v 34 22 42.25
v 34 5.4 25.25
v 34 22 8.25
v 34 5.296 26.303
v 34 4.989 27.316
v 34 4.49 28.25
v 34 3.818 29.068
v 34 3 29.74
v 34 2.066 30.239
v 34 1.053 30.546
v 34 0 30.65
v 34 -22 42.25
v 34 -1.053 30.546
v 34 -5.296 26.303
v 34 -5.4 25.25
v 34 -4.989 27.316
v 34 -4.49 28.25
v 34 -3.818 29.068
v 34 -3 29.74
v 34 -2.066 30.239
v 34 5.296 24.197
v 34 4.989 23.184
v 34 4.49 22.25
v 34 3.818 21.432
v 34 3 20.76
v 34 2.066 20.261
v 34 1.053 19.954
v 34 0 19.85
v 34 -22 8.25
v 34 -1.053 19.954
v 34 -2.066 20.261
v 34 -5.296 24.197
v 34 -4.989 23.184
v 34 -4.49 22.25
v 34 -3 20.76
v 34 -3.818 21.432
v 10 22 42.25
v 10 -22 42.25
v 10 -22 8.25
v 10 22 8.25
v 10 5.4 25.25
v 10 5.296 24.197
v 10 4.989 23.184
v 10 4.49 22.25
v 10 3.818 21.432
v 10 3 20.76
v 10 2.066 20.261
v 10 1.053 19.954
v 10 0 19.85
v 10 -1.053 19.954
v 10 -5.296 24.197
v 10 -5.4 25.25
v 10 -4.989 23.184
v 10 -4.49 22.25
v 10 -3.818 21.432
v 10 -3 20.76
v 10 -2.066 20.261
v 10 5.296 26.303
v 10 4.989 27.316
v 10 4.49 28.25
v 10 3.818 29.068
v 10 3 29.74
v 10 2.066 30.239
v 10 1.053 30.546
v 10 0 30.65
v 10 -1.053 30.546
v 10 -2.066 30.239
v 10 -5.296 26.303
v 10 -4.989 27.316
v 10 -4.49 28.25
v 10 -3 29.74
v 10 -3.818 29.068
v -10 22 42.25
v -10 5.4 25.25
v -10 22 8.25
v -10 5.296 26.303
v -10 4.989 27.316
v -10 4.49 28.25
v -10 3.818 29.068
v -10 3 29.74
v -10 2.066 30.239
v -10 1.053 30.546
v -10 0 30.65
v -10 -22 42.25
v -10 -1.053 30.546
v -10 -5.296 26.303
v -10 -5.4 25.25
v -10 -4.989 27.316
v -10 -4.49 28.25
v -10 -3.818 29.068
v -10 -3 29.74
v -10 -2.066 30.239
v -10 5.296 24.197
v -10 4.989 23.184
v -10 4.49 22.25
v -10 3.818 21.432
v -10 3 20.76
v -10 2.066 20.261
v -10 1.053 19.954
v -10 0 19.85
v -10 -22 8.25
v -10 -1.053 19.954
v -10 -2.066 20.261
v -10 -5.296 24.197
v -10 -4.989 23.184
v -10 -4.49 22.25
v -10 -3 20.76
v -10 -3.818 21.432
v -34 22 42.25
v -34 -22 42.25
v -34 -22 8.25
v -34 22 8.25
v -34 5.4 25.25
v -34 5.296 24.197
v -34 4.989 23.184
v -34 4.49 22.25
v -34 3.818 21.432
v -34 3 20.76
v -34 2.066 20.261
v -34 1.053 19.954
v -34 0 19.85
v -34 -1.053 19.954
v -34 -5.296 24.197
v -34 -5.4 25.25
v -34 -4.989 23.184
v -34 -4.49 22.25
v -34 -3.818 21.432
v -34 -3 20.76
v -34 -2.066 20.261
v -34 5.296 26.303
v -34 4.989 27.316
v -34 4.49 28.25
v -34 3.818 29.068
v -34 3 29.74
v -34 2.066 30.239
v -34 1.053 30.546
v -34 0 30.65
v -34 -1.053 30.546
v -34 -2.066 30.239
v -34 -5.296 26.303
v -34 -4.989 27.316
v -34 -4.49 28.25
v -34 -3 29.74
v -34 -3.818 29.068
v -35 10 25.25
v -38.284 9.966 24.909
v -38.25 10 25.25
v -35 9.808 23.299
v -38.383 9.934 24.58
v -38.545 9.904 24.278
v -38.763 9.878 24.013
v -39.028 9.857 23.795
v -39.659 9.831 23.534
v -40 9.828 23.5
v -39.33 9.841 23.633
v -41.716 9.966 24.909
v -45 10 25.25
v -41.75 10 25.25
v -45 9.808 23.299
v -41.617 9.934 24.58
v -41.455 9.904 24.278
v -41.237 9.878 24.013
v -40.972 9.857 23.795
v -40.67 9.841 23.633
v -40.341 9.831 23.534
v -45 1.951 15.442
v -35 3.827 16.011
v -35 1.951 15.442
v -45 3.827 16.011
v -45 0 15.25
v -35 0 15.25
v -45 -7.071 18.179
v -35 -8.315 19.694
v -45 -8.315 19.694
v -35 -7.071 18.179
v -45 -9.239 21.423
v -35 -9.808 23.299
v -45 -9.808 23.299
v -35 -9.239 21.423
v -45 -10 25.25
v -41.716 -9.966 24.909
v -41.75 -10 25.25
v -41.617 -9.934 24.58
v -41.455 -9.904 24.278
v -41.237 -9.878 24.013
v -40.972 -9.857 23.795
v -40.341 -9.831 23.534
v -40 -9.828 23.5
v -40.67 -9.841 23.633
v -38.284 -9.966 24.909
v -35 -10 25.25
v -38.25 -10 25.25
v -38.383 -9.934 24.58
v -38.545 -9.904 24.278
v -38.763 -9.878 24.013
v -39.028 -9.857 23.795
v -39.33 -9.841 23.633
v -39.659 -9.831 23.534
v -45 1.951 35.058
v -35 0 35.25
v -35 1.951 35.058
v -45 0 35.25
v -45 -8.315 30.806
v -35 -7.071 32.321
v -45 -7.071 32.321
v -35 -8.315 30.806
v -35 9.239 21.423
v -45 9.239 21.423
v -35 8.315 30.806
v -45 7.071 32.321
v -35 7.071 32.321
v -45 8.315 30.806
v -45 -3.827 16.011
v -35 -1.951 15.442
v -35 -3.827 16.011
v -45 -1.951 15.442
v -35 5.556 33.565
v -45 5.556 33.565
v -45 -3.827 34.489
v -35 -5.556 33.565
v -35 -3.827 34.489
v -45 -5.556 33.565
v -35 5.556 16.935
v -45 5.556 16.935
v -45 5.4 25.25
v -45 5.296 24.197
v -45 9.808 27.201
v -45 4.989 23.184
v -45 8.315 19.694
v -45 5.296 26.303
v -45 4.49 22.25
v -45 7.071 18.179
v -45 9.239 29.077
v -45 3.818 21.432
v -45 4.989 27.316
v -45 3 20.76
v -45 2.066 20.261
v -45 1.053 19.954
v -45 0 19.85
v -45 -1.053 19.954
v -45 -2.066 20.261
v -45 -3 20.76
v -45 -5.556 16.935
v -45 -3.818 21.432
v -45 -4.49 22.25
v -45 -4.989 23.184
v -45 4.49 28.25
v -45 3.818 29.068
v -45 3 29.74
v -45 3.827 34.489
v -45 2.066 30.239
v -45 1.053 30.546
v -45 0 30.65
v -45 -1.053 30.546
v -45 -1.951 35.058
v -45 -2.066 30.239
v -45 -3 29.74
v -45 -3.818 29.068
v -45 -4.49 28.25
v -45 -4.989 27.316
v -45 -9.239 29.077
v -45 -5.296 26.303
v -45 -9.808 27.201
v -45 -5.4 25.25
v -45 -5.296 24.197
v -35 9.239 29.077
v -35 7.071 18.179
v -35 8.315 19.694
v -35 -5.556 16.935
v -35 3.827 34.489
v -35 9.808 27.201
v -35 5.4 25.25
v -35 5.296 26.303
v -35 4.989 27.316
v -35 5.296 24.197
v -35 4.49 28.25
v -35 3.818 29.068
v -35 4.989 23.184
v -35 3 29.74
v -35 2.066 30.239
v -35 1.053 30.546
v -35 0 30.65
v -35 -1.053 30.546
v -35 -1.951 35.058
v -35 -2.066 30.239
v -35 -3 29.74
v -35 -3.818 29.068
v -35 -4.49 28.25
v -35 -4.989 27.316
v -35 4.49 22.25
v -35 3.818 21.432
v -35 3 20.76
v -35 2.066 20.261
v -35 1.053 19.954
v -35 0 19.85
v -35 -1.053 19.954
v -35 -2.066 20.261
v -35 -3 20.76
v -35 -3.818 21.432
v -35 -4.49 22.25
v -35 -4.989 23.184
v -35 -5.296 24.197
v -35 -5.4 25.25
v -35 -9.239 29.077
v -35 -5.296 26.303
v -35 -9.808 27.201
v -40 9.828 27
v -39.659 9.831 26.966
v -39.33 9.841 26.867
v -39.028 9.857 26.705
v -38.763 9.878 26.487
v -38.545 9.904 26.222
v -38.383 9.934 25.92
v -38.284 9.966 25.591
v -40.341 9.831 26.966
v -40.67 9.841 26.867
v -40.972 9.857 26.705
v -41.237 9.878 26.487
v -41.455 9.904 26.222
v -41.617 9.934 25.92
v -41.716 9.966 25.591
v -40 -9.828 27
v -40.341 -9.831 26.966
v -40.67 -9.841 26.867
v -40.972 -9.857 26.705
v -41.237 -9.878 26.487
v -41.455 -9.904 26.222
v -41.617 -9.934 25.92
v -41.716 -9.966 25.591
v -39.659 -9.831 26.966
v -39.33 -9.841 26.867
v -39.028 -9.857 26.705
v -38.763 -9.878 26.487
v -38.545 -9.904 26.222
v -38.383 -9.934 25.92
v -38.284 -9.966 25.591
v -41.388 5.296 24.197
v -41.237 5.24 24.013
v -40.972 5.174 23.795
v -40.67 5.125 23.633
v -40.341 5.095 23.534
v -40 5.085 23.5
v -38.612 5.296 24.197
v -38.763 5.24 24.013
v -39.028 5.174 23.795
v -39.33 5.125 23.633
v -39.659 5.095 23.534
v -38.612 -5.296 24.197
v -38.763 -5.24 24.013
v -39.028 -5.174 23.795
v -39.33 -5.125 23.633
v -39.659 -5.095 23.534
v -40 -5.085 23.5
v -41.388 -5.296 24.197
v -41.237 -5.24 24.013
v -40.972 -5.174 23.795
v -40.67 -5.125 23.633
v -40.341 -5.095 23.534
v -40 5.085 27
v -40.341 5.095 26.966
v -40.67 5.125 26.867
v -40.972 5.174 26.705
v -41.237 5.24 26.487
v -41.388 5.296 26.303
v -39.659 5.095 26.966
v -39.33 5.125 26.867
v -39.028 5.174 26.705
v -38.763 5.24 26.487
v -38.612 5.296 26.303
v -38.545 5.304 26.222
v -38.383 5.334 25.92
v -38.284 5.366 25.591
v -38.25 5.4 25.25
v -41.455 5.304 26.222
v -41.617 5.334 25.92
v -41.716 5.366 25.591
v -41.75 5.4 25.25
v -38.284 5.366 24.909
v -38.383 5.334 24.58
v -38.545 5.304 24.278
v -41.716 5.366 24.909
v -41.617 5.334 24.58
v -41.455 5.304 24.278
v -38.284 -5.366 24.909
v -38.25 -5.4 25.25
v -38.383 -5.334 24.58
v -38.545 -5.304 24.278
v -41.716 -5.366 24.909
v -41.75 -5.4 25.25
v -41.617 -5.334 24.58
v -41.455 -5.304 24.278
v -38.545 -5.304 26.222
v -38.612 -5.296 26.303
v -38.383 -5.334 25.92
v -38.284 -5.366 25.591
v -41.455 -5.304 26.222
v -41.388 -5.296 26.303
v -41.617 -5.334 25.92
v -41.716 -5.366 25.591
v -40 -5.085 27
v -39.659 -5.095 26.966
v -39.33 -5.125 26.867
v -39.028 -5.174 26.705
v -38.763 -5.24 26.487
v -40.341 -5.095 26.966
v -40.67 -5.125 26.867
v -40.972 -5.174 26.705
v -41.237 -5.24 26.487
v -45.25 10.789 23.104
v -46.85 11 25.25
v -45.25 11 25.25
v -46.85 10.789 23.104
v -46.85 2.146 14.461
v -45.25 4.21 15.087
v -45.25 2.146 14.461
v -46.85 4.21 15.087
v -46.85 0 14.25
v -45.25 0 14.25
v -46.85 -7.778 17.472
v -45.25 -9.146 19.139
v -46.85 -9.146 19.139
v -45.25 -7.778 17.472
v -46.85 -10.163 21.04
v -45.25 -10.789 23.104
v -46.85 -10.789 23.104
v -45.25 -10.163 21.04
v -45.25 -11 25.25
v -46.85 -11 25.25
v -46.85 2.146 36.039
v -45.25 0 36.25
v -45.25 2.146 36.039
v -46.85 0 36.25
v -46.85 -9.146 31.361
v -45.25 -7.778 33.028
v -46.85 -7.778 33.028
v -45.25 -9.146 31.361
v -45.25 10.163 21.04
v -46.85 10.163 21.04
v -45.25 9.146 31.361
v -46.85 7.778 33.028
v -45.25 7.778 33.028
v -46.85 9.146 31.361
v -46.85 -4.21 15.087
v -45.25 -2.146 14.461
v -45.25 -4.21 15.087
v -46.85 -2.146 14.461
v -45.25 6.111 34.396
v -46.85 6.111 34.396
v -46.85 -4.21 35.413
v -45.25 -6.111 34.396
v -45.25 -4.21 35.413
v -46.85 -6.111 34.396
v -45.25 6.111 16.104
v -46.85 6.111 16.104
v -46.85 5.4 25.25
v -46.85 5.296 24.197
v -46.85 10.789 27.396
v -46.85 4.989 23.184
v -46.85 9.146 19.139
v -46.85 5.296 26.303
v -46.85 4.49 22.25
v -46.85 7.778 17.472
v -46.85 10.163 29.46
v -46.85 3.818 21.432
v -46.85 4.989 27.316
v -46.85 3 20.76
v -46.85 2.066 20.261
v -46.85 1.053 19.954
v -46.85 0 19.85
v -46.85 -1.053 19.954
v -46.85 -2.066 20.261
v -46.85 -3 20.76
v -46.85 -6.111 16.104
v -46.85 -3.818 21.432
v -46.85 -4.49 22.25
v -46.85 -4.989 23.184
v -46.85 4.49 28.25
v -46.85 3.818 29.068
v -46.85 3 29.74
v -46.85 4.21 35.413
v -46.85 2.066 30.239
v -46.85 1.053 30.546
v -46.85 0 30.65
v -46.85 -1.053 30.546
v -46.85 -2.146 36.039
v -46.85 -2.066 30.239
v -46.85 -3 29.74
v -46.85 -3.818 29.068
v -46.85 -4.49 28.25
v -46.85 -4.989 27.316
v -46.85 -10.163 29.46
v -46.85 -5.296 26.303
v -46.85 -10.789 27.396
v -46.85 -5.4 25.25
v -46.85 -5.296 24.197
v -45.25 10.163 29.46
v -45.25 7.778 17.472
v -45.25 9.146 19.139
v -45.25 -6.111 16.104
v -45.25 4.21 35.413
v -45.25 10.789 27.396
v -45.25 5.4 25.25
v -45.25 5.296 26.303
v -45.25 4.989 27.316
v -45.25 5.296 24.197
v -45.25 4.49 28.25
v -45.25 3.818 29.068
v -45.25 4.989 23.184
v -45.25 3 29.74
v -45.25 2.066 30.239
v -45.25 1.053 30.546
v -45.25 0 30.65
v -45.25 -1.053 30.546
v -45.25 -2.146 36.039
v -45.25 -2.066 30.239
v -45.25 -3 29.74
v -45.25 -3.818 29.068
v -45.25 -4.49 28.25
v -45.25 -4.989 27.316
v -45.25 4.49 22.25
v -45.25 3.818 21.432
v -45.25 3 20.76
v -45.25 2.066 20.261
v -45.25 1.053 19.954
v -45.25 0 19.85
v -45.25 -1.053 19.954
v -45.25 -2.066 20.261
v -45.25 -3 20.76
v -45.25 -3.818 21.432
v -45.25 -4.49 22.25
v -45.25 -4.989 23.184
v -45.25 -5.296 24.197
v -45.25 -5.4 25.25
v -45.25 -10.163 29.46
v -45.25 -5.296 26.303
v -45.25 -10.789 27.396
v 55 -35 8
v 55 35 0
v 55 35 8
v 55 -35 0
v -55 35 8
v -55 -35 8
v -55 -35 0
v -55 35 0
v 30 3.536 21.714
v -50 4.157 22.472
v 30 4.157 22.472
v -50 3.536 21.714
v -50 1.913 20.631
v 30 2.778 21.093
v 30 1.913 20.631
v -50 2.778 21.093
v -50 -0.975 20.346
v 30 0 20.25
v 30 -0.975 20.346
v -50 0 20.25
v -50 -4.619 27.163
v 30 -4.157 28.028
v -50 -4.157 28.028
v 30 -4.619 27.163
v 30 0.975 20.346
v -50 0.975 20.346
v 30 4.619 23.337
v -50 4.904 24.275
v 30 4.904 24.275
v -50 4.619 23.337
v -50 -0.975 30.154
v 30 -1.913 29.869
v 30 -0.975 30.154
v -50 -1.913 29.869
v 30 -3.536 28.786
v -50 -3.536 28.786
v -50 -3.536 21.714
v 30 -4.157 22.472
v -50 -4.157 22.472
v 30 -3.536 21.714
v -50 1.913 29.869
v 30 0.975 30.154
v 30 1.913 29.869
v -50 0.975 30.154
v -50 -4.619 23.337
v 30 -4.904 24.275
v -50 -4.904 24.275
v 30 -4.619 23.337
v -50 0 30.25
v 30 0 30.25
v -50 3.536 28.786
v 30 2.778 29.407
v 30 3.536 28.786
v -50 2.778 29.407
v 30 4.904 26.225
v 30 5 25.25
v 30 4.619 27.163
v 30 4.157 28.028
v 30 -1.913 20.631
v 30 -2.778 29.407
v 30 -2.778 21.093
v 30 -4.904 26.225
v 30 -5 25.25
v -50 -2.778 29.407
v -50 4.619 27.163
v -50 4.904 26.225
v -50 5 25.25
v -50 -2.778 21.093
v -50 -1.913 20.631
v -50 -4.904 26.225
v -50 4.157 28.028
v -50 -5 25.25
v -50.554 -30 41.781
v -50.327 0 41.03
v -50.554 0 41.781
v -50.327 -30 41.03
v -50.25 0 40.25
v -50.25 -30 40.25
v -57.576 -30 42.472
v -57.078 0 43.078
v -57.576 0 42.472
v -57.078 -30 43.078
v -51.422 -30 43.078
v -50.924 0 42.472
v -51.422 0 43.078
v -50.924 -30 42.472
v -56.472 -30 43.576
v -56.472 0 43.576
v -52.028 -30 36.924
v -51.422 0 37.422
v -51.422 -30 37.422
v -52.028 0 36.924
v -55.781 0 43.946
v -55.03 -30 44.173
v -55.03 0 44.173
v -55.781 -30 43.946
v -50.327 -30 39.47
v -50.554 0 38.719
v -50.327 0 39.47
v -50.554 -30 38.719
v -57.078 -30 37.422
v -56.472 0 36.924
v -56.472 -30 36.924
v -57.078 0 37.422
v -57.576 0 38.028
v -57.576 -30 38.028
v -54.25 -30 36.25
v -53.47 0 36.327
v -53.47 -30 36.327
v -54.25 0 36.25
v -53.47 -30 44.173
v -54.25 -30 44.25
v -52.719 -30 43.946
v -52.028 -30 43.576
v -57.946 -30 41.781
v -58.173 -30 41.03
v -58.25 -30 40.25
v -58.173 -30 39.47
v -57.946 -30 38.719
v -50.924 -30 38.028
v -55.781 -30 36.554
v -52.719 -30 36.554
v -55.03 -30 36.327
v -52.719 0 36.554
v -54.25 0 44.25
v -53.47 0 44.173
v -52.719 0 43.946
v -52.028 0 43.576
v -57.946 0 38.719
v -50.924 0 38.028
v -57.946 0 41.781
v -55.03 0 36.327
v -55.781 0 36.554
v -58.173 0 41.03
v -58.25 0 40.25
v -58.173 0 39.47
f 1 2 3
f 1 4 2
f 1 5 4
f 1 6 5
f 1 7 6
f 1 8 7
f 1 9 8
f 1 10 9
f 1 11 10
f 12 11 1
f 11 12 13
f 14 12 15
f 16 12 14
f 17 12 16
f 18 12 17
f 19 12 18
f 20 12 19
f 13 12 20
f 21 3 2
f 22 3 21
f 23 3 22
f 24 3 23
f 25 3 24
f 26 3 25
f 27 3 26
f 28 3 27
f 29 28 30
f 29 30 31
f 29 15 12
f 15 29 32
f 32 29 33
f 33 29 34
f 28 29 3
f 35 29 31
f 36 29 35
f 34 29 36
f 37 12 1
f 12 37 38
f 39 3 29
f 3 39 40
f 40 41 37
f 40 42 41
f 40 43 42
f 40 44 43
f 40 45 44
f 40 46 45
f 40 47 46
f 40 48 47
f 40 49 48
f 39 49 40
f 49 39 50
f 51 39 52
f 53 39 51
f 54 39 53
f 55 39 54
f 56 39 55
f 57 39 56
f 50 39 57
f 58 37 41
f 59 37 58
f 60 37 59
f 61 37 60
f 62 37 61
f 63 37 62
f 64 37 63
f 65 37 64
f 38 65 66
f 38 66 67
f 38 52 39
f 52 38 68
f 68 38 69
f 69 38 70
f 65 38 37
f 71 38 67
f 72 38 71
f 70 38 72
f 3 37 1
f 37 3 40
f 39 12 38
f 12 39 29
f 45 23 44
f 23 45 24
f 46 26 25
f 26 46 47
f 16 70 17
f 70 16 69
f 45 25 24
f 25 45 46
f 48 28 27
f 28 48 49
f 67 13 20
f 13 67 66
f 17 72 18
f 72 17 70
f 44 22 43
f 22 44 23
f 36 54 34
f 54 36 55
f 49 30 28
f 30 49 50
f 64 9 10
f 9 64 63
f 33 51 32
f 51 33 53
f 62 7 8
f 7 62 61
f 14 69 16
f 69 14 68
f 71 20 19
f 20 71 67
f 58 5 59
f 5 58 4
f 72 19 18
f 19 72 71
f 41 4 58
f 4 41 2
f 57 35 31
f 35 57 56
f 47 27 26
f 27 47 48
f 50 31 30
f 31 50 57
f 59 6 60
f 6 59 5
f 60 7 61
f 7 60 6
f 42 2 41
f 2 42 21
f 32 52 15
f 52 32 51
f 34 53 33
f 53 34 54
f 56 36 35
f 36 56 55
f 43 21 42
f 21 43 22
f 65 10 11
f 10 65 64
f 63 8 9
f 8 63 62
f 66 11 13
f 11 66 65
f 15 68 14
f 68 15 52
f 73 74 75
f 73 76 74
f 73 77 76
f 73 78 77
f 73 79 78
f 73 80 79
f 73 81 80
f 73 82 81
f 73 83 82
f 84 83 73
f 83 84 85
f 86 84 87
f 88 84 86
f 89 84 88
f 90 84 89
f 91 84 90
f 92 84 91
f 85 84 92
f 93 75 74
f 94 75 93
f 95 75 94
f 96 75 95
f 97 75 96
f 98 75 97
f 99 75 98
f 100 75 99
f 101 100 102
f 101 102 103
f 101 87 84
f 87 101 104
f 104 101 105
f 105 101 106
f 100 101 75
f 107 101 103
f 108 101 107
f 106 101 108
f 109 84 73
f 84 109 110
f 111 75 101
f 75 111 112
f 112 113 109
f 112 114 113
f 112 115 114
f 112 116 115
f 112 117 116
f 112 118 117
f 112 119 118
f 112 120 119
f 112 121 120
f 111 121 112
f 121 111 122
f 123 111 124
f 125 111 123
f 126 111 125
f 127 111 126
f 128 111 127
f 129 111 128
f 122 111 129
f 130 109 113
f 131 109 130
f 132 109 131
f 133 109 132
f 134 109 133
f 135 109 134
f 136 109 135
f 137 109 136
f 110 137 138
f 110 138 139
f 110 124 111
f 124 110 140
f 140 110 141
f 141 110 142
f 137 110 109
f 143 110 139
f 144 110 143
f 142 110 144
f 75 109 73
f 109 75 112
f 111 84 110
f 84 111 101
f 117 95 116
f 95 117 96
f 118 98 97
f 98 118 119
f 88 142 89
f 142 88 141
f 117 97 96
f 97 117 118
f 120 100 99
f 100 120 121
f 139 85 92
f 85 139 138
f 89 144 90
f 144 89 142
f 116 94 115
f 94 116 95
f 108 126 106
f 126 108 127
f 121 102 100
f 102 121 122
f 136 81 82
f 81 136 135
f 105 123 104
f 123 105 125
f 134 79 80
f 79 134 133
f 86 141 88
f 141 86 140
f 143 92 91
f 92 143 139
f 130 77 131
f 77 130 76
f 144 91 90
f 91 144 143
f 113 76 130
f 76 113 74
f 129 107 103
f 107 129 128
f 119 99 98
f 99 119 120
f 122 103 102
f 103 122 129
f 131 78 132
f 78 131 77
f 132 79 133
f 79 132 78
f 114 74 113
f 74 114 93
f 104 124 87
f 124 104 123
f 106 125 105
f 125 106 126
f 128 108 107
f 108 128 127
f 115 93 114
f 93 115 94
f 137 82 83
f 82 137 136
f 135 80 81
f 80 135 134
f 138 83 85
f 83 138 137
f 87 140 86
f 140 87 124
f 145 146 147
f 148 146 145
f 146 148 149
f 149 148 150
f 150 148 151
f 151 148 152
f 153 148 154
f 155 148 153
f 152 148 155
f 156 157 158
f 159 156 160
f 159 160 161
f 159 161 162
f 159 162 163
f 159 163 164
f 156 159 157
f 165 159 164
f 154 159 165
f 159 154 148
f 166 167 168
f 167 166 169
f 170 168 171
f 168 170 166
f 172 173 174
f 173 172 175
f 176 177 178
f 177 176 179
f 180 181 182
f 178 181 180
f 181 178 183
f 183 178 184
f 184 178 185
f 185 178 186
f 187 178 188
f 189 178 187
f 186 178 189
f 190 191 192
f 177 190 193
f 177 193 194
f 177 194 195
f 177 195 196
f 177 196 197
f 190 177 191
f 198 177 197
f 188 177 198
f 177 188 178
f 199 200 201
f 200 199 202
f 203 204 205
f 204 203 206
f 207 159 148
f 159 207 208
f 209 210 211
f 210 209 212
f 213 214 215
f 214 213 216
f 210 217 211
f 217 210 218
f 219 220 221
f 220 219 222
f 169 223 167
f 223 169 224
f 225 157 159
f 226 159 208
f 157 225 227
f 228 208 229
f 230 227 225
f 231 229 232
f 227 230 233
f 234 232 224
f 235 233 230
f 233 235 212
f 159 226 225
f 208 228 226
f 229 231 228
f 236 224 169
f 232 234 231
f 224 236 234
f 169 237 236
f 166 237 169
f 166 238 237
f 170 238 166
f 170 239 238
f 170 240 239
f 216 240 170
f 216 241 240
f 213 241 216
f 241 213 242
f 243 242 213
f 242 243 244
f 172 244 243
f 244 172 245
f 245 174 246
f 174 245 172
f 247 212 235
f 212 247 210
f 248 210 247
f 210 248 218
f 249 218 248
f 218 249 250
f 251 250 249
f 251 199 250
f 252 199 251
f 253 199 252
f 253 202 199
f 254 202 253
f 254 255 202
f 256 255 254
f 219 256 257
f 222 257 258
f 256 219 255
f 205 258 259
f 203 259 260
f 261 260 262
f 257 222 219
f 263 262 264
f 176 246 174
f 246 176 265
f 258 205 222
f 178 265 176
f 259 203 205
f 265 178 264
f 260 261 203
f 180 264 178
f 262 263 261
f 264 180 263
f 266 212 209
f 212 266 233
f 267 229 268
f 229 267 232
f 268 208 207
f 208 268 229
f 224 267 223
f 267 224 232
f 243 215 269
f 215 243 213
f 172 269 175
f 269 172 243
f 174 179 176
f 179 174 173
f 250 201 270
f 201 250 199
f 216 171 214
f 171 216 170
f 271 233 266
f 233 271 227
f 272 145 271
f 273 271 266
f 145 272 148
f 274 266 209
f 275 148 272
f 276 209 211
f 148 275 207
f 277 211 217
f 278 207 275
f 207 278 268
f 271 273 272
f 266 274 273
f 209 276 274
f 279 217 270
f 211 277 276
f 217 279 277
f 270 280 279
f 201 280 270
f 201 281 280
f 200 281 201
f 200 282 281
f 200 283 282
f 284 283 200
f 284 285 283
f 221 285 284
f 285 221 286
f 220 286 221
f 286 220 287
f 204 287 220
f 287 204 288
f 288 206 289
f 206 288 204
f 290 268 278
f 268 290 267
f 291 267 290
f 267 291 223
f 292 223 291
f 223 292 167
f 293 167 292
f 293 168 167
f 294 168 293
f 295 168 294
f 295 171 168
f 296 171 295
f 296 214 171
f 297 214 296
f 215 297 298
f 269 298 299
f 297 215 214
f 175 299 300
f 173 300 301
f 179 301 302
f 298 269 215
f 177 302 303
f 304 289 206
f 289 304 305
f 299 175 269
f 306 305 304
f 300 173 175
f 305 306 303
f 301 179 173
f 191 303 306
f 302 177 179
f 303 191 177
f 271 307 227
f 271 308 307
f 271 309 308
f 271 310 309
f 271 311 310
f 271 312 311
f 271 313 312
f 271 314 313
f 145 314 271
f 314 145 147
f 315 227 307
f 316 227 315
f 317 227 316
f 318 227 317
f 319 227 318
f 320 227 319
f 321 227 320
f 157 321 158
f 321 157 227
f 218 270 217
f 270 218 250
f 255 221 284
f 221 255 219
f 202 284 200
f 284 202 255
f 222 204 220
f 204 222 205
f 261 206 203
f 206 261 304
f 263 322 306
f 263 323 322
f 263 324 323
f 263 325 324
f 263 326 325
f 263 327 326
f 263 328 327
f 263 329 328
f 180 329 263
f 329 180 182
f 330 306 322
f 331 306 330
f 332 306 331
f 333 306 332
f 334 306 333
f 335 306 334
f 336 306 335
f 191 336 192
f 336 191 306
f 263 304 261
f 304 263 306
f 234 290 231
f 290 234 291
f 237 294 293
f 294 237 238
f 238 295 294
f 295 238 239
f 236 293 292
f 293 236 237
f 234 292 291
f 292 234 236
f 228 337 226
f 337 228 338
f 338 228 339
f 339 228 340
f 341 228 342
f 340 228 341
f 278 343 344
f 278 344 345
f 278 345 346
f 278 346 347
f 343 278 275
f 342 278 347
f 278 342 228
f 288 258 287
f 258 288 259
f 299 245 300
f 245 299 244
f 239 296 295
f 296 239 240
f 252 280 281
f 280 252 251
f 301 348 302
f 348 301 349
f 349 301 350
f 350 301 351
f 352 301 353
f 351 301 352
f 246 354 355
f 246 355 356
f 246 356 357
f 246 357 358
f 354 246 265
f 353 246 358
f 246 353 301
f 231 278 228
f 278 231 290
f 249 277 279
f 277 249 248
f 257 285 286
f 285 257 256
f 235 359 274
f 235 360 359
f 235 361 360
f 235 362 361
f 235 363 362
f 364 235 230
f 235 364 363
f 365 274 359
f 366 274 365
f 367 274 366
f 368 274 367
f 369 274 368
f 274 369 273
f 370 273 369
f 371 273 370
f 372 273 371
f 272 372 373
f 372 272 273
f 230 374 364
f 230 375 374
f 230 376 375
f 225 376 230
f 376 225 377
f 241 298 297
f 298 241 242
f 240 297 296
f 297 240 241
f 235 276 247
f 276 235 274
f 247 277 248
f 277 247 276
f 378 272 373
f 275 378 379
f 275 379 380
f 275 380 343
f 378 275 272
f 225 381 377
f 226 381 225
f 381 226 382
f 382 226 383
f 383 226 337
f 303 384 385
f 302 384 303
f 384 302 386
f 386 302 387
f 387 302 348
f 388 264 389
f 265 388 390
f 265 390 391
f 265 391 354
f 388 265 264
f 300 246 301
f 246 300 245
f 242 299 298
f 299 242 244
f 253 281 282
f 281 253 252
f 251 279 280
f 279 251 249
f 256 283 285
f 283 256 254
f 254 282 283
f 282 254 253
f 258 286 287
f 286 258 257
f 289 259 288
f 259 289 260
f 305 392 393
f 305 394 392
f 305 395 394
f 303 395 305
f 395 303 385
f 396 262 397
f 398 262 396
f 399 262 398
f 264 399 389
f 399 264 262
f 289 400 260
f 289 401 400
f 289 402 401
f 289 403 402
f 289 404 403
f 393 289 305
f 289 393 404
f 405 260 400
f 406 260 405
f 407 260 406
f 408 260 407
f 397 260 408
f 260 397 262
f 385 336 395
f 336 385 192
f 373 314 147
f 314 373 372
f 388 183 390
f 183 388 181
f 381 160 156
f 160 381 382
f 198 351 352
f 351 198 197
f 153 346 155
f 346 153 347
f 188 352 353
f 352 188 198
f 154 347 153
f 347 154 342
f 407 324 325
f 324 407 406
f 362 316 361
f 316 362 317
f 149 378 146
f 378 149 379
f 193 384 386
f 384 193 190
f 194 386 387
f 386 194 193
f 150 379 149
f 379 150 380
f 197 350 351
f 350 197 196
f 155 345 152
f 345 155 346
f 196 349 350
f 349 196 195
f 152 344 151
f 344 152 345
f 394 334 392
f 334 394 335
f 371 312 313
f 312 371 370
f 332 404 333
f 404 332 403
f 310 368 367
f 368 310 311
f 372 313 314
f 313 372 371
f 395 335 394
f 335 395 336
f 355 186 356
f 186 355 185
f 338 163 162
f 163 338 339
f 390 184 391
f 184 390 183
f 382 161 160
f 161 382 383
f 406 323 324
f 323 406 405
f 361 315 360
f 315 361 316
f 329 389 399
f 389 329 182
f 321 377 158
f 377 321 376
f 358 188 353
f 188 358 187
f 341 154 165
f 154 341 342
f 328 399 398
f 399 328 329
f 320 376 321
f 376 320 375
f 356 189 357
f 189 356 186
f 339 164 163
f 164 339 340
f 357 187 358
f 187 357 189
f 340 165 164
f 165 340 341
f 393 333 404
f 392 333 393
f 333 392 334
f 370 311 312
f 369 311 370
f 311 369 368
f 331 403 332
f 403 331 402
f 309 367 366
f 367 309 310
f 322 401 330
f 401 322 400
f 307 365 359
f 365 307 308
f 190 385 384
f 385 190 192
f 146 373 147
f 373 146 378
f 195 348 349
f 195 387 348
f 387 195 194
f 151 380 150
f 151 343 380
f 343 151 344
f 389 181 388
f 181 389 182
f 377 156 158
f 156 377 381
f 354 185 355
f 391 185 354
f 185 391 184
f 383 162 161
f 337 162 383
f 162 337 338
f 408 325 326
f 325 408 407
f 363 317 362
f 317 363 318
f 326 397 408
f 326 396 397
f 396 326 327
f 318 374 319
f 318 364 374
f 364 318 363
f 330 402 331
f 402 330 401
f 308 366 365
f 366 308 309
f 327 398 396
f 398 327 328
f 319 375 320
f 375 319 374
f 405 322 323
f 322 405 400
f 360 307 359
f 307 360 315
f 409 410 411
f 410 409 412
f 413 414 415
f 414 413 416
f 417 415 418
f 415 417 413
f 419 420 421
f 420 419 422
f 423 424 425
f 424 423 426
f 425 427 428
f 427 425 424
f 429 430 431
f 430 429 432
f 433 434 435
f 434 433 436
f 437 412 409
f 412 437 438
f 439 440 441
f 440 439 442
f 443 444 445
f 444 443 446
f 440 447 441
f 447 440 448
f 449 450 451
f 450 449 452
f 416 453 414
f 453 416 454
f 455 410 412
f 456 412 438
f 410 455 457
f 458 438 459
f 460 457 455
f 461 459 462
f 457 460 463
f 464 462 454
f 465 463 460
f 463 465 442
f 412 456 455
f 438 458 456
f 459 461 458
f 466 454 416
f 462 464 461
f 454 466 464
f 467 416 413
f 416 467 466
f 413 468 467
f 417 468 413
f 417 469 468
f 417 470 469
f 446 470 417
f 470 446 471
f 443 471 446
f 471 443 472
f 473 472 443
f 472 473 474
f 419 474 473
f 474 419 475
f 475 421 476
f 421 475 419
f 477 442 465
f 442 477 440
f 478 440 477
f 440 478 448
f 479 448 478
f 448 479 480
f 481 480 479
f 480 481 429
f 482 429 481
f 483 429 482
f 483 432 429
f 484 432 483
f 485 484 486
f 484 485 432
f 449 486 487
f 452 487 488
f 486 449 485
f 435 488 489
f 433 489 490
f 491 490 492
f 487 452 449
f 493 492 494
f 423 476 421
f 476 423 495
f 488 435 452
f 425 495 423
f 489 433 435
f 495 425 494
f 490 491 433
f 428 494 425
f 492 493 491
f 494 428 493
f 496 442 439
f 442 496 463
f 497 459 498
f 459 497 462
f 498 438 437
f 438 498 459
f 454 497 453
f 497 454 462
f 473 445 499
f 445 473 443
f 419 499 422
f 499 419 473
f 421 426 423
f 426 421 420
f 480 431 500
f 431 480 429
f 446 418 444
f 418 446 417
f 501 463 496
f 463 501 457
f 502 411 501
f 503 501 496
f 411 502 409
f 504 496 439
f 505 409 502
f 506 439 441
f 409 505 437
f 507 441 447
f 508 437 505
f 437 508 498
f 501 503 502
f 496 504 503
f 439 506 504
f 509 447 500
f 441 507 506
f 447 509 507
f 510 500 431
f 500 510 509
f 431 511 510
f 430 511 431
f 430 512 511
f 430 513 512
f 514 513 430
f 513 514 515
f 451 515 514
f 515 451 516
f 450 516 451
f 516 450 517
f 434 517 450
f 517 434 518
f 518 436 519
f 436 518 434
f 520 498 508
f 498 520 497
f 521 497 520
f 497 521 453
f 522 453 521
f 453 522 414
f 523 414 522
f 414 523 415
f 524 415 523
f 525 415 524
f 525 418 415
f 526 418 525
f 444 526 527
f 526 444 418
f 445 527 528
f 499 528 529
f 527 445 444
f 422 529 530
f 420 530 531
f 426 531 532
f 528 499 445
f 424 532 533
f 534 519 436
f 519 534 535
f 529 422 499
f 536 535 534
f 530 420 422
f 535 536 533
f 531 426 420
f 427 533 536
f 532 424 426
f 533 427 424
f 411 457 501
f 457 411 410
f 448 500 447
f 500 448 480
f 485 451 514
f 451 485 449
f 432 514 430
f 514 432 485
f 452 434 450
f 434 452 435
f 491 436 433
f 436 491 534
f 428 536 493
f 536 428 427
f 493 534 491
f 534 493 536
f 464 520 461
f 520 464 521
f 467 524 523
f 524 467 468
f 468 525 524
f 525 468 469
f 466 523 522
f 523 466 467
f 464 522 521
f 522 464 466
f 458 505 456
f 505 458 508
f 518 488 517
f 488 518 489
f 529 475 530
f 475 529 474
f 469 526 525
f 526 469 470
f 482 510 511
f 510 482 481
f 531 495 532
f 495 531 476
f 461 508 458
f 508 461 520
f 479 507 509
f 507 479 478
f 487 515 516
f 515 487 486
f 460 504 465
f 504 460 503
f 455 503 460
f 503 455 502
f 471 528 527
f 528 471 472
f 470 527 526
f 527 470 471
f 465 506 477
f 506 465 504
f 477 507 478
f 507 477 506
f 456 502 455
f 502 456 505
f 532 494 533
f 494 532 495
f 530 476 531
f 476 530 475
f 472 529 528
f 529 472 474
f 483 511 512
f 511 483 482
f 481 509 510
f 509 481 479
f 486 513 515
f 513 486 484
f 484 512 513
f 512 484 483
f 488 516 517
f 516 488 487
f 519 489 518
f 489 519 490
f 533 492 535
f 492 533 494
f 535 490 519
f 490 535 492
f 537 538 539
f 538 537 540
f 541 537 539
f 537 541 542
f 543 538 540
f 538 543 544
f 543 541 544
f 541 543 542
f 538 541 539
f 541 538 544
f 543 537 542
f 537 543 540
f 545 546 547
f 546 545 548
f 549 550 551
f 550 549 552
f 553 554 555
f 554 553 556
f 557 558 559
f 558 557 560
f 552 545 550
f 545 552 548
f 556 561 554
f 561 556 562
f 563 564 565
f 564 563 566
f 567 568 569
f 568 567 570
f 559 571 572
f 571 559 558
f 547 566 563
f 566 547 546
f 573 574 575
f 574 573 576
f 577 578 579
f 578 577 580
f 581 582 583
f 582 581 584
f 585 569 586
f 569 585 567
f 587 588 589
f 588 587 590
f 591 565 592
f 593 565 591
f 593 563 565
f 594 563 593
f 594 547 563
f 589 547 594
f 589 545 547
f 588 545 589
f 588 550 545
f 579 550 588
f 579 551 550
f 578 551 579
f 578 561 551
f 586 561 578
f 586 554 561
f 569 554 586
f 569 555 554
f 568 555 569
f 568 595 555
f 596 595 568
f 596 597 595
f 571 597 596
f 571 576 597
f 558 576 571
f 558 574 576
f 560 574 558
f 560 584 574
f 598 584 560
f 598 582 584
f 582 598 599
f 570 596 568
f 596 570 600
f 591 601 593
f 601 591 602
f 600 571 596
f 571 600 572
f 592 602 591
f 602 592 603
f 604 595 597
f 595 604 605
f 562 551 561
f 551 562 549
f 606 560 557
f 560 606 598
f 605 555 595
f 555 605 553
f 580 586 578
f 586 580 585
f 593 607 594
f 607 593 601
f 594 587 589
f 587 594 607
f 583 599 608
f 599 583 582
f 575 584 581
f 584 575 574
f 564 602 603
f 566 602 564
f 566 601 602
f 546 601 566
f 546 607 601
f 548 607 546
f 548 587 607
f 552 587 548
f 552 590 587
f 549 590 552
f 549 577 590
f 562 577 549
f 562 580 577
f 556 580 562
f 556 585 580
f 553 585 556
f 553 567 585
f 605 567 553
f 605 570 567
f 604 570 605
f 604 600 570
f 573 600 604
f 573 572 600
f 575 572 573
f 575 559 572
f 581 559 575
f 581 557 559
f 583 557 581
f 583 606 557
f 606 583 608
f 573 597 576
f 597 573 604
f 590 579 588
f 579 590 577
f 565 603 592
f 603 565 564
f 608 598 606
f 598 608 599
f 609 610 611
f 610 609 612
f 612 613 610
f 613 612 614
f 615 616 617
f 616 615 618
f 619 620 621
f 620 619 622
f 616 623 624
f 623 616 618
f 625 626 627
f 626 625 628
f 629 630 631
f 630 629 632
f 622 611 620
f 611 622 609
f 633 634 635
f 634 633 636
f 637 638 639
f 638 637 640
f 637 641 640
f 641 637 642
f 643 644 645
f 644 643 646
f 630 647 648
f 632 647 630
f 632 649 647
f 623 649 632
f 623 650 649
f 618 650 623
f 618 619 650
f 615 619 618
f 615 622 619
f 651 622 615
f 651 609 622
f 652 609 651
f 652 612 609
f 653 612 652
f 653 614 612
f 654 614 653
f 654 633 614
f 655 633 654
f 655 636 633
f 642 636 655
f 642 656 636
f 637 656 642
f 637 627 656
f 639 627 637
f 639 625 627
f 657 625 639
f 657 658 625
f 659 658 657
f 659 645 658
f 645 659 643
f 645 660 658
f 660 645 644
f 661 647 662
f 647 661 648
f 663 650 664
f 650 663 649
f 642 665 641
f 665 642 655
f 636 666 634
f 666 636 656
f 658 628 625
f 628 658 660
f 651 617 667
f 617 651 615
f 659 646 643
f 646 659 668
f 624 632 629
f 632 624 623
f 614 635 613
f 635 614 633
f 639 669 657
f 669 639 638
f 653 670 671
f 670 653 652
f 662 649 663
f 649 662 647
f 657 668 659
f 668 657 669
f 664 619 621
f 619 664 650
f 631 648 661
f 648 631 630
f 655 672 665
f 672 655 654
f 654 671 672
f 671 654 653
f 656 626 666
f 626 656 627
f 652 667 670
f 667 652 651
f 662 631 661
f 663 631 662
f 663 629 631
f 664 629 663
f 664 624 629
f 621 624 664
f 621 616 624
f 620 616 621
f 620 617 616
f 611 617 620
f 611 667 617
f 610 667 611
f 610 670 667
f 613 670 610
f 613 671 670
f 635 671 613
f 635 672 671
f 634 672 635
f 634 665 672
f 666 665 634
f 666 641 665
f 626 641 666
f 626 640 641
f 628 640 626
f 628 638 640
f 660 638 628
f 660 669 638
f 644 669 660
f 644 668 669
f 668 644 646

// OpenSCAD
$fn = 32;

// ------------------------------------------------------------------------
// Machine vise: screw d10, jaws 24 x 34 mm
// Every part is its own module, assembly() places every instance.
// ------------------------------------------------------------------------

// --- part 1 ---
module vise_bed() {
  difference() {
    translate([-55, -35, 0]) cube([110, 70, 8]);
  }
}

// --- part 2 ---
module vise_jaw() {
  difference() {
    translate([-12, -22, 0]) cube([24, 44, 34]);
    translate([0, 0, 17]) rotate([0, 90, 0]) cylinder(h = 26, d = 10.8, center = true);
  }
}

// --- part 3 ---
module vise_screw() {
  translate([0, 0, -40]) cylinder(h = 80, d = 10);
}

// --- part 4 ---
module screw_collar() {
  difference() {
    cylinder(h = 10, d = 20);
    translate([0, 0, -1]) cylinder(h = 12, d = 10.8);
    translate([0, 0, 5]) rotate([90, 0, 0]) cylinder(h = 22, d = 3.5, center = true);
  }
}

// --- part 5 ---
module screw_washer() {
  difference() {
      translate([0, 0, 0]) cylinder(h = 1.6, d = 22);
      translate([0, 0, -1]) cylinder(h = 3.6, d = 10.8);
    }
}

// --- part 6 ---
module vise_handle() {
  cylinder(h = 30, d = 8);
}

// --- assembly ---
module assembly() {
  color([0.80, 0.24, 0.20]) translate([0, 0, 0]) rotate([0, 0, 0]) vise_bed();
  color([0.20, 0.45, 0.75]) translate([22, 0, 8.25]) rotate([0, 0, 0]) vise_jaw();
  color([0.25, 0.62, 0.32]) translate([-22, 0, 8.25]) rotate([0, 0, 0]) vise_jaw();
  color([0.92, 0.70, 0.18]) translate([-10, 0, 25.25]) rotate([0, 90, 0]) vise_screw();
  color([0.58, 0.35, 0.70]) translate([-45, 0, 25.25]) rotate([0, 90, 0]) screw_collar();
  color([0.16, 0.66, 0.66]) translate([-46.85, 0, 25.25]) rotate([0, 90, 0]) screw_washer();
  color([0.85, 0.48, 0.18]) translate([-54.25, 0, 40.25]) rotate([90, 0, 0]) vise_handle();
}

assembly();
